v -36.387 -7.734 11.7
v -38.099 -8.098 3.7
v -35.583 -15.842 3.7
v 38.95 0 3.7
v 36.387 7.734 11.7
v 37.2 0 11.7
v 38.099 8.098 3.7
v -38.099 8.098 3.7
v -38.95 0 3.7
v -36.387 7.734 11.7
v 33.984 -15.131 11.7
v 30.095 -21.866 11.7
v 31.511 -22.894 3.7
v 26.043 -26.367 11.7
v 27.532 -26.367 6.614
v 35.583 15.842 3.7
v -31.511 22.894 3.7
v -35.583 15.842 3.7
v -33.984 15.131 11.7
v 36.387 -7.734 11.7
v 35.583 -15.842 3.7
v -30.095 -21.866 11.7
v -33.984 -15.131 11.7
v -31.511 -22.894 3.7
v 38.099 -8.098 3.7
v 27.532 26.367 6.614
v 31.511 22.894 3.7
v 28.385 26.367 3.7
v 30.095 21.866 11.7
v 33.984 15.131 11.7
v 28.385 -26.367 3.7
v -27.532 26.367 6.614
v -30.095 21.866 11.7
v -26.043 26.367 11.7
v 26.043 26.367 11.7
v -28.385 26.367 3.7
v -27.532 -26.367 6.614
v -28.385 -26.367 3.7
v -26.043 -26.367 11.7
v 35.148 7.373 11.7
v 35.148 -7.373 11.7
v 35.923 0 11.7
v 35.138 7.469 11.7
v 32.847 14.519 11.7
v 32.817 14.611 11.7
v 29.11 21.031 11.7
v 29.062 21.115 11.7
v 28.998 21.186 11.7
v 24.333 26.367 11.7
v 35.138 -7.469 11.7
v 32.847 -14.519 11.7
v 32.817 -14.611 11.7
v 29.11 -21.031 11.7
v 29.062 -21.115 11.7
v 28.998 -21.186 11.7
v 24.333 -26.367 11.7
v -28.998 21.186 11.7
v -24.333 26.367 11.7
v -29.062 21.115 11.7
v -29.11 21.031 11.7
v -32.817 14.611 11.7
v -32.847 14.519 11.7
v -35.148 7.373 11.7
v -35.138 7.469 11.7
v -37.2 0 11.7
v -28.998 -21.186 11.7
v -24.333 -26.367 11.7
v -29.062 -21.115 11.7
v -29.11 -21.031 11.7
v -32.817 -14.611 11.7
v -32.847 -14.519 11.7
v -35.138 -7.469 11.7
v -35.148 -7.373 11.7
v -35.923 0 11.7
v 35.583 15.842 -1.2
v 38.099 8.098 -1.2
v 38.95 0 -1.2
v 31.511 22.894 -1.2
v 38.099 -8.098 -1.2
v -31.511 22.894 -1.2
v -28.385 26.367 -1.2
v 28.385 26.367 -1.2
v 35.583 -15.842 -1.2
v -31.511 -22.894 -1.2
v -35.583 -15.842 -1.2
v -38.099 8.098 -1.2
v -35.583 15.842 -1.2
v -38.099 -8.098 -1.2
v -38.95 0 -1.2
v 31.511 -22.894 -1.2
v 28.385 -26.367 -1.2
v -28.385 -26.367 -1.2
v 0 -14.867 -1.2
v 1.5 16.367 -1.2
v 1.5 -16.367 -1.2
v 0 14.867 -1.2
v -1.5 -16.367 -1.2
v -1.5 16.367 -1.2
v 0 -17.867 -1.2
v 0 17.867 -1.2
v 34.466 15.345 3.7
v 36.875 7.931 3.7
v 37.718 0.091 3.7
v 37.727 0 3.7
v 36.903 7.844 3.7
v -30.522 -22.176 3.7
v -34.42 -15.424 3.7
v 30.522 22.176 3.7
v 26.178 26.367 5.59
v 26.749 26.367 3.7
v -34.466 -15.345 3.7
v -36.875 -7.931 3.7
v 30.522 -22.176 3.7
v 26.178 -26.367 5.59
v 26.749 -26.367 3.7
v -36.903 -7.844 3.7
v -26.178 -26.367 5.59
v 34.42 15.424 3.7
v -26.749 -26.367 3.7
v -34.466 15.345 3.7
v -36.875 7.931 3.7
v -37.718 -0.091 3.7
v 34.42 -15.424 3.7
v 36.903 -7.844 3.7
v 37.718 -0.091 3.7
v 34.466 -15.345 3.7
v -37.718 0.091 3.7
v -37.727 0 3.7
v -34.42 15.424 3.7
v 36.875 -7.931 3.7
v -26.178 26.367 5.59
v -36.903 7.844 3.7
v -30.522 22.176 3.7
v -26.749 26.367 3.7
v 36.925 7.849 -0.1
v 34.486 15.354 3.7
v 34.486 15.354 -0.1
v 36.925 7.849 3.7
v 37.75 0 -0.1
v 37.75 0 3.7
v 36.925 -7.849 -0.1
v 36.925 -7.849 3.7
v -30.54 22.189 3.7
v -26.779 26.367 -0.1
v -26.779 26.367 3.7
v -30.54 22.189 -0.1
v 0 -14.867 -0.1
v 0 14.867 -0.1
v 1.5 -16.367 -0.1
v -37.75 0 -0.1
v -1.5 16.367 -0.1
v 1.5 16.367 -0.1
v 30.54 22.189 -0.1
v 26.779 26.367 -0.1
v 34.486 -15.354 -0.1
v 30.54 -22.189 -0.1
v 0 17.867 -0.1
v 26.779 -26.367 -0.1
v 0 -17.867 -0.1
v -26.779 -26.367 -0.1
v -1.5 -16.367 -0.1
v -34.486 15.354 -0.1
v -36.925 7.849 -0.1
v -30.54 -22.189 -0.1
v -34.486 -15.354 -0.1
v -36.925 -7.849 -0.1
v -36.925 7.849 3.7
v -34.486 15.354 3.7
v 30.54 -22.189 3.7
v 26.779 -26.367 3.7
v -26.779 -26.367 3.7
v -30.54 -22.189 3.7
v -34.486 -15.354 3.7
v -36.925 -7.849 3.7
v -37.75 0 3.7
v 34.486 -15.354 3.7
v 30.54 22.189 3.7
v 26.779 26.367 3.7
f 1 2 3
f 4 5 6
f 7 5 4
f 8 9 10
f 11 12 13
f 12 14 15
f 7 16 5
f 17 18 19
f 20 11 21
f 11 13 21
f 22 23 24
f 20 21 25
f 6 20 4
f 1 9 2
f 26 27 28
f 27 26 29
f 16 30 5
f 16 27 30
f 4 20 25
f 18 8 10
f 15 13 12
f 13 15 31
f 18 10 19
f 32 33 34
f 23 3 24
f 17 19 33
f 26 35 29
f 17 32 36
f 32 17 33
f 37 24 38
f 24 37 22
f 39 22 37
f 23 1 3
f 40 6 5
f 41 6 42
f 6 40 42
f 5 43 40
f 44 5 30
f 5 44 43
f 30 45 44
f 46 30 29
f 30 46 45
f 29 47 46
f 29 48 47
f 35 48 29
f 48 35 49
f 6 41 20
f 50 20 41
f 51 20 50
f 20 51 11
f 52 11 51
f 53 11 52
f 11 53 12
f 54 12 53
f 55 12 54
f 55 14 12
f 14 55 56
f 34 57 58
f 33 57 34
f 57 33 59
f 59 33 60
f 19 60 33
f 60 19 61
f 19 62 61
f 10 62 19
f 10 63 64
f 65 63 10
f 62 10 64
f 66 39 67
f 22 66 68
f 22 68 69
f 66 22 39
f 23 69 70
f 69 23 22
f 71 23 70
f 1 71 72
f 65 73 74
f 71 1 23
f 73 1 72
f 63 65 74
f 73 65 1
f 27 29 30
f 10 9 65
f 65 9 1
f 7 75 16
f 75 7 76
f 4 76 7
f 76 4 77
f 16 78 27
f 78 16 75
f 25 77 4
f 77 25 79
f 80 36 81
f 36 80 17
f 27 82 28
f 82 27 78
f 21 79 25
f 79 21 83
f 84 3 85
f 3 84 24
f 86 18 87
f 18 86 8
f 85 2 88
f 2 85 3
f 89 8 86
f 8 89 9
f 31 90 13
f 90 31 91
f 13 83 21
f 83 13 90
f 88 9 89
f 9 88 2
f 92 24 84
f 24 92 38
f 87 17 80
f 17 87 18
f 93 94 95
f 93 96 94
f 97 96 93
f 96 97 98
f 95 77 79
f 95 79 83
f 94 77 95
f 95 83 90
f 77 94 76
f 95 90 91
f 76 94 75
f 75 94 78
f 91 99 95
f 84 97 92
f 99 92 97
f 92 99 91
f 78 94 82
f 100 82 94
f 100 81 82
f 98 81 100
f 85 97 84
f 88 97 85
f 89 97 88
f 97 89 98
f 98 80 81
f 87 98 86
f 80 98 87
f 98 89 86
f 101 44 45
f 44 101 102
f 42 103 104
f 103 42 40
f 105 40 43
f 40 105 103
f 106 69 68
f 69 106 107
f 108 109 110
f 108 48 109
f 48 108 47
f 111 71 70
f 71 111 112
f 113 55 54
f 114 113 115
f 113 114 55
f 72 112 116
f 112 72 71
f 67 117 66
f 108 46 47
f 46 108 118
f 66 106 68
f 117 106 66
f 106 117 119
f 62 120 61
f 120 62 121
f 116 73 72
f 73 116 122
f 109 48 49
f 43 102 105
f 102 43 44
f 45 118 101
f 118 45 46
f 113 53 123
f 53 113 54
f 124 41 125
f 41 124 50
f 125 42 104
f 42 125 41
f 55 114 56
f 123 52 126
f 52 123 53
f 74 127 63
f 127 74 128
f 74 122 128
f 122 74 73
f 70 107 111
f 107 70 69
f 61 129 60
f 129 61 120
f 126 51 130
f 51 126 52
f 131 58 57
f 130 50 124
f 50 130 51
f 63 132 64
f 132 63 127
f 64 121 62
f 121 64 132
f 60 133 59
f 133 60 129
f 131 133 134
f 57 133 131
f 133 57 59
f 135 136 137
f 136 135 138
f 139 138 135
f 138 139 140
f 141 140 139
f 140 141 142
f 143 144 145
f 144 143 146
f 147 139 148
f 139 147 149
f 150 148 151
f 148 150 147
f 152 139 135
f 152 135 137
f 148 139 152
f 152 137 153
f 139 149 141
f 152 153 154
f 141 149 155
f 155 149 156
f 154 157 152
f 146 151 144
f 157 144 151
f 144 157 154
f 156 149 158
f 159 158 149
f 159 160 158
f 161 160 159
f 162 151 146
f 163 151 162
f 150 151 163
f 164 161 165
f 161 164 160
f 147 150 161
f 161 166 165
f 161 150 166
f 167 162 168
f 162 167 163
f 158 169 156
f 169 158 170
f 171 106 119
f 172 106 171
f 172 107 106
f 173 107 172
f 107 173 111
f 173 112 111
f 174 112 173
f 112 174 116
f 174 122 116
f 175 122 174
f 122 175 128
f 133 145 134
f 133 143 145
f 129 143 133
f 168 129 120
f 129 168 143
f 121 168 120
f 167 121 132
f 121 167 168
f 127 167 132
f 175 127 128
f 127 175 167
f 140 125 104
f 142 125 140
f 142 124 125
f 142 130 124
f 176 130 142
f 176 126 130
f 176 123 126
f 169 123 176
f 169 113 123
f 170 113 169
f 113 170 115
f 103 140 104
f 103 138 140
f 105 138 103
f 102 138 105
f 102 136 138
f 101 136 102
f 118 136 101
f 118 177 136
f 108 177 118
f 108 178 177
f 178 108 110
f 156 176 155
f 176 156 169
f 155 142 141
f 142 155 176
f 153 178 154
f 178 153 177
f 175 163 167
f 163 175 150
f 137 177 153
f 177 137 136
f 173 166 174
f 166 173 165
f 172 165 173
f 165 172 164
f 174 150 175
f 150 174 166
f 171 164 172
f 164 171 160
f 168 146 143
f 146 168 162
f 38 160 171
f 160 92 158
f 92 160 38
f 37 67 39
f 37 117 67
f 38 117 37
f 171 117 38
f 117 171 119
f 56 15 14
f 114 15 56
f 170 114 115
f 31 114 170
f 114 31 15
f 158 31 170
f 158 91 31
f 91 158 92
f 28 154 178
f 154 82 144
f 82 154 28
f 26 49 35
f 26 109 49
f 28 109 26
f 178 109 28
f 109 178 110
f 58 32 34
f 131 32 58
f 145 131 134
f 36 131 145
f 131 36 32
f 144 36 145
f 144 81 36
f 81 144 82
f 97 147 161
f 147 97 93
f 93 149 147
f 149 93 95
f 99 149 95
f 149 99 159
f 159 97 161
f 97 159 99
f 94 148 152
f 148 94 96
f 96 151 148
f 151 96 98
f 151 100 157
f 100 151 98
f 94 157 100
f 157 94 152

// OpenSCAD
// outer diameter of button
edge=75.5;

// diameter of middle 
middle=72;

// how tall feet are 
feet=3.7;

// distance from edge to middle
to_middle=8;

cut_offset=edge/6;

// printer settings
extrusion_width=1.2;
layer_height=0.4;

// thickness of the sides
wall=extrusion_width;
walll=wall*2;

// thickness of back of part
base=wall;

// used for first layer adhesion issues
brim=10;

tack_stem=3;
tack_pad=20;

// pad negative space for clean renders
pad=0.1;
padd=pad*2;

module body(extra=0,padding=0) {
    translate([0,0,feet-padding])
    cylinder(d1=edge+extra,d2=middle+extra-padding*2,h=to_middle+padding*2);
    translate([0,0,-padding])
    cylinder(d=edge+extra,h=feet+padding);
}

module base() {
    translate([0,0,-base])
    cylinder(d=edge+walll,h=base);
}

module tack_hole(y) {
    translate([0,y,-base-pad])
    cylinder(d=tack_stem,h=base+padd,$fn=4);
}

module tack_holes() {
    tack_hole(-edge/2-wall+cut_offset+tack_pad/2);
    mirror([0,1,0])
    tack_hole(-edge/2-wall+cut_offset+tack_pad/2);
}

module cut() {
    translate([-edge/2-wall-pad,-edge-walll-edge/2-wall+cut_offset,-pad-base])
    cube([edge+walll,edge+walll,feet+to_middle+pad*2+base]);
}

module cuts() {
    cut();
    mirror([0,1,0])
    cut();
}

module assembled() {
    difference() {
        union() {
            body(walll,0);
            base();
        }
        body(0,pad);
        cuts();
        tack_holes();
    }
}

module brim() {
    translate([-brim/2-edge/2,-to_middle-feet-brim/2,-edge/2+cut_offset-layer_height-wall])
    cube([edge+brim,to_middle+feet+brim+base,layer_height]);
}

module to_print() {
    $fn=400;
    rotate([90,0,0])
    assembled(); 
}

// https://www.thingiverse.com/thing:2985920
display="";
if (display == "") assembled(); 
if (display == "echo_button_mount.stl") to_print(); 
if (display == "echo_button_mount_with_brim.stl") {
    to_print();
    brim();
}
